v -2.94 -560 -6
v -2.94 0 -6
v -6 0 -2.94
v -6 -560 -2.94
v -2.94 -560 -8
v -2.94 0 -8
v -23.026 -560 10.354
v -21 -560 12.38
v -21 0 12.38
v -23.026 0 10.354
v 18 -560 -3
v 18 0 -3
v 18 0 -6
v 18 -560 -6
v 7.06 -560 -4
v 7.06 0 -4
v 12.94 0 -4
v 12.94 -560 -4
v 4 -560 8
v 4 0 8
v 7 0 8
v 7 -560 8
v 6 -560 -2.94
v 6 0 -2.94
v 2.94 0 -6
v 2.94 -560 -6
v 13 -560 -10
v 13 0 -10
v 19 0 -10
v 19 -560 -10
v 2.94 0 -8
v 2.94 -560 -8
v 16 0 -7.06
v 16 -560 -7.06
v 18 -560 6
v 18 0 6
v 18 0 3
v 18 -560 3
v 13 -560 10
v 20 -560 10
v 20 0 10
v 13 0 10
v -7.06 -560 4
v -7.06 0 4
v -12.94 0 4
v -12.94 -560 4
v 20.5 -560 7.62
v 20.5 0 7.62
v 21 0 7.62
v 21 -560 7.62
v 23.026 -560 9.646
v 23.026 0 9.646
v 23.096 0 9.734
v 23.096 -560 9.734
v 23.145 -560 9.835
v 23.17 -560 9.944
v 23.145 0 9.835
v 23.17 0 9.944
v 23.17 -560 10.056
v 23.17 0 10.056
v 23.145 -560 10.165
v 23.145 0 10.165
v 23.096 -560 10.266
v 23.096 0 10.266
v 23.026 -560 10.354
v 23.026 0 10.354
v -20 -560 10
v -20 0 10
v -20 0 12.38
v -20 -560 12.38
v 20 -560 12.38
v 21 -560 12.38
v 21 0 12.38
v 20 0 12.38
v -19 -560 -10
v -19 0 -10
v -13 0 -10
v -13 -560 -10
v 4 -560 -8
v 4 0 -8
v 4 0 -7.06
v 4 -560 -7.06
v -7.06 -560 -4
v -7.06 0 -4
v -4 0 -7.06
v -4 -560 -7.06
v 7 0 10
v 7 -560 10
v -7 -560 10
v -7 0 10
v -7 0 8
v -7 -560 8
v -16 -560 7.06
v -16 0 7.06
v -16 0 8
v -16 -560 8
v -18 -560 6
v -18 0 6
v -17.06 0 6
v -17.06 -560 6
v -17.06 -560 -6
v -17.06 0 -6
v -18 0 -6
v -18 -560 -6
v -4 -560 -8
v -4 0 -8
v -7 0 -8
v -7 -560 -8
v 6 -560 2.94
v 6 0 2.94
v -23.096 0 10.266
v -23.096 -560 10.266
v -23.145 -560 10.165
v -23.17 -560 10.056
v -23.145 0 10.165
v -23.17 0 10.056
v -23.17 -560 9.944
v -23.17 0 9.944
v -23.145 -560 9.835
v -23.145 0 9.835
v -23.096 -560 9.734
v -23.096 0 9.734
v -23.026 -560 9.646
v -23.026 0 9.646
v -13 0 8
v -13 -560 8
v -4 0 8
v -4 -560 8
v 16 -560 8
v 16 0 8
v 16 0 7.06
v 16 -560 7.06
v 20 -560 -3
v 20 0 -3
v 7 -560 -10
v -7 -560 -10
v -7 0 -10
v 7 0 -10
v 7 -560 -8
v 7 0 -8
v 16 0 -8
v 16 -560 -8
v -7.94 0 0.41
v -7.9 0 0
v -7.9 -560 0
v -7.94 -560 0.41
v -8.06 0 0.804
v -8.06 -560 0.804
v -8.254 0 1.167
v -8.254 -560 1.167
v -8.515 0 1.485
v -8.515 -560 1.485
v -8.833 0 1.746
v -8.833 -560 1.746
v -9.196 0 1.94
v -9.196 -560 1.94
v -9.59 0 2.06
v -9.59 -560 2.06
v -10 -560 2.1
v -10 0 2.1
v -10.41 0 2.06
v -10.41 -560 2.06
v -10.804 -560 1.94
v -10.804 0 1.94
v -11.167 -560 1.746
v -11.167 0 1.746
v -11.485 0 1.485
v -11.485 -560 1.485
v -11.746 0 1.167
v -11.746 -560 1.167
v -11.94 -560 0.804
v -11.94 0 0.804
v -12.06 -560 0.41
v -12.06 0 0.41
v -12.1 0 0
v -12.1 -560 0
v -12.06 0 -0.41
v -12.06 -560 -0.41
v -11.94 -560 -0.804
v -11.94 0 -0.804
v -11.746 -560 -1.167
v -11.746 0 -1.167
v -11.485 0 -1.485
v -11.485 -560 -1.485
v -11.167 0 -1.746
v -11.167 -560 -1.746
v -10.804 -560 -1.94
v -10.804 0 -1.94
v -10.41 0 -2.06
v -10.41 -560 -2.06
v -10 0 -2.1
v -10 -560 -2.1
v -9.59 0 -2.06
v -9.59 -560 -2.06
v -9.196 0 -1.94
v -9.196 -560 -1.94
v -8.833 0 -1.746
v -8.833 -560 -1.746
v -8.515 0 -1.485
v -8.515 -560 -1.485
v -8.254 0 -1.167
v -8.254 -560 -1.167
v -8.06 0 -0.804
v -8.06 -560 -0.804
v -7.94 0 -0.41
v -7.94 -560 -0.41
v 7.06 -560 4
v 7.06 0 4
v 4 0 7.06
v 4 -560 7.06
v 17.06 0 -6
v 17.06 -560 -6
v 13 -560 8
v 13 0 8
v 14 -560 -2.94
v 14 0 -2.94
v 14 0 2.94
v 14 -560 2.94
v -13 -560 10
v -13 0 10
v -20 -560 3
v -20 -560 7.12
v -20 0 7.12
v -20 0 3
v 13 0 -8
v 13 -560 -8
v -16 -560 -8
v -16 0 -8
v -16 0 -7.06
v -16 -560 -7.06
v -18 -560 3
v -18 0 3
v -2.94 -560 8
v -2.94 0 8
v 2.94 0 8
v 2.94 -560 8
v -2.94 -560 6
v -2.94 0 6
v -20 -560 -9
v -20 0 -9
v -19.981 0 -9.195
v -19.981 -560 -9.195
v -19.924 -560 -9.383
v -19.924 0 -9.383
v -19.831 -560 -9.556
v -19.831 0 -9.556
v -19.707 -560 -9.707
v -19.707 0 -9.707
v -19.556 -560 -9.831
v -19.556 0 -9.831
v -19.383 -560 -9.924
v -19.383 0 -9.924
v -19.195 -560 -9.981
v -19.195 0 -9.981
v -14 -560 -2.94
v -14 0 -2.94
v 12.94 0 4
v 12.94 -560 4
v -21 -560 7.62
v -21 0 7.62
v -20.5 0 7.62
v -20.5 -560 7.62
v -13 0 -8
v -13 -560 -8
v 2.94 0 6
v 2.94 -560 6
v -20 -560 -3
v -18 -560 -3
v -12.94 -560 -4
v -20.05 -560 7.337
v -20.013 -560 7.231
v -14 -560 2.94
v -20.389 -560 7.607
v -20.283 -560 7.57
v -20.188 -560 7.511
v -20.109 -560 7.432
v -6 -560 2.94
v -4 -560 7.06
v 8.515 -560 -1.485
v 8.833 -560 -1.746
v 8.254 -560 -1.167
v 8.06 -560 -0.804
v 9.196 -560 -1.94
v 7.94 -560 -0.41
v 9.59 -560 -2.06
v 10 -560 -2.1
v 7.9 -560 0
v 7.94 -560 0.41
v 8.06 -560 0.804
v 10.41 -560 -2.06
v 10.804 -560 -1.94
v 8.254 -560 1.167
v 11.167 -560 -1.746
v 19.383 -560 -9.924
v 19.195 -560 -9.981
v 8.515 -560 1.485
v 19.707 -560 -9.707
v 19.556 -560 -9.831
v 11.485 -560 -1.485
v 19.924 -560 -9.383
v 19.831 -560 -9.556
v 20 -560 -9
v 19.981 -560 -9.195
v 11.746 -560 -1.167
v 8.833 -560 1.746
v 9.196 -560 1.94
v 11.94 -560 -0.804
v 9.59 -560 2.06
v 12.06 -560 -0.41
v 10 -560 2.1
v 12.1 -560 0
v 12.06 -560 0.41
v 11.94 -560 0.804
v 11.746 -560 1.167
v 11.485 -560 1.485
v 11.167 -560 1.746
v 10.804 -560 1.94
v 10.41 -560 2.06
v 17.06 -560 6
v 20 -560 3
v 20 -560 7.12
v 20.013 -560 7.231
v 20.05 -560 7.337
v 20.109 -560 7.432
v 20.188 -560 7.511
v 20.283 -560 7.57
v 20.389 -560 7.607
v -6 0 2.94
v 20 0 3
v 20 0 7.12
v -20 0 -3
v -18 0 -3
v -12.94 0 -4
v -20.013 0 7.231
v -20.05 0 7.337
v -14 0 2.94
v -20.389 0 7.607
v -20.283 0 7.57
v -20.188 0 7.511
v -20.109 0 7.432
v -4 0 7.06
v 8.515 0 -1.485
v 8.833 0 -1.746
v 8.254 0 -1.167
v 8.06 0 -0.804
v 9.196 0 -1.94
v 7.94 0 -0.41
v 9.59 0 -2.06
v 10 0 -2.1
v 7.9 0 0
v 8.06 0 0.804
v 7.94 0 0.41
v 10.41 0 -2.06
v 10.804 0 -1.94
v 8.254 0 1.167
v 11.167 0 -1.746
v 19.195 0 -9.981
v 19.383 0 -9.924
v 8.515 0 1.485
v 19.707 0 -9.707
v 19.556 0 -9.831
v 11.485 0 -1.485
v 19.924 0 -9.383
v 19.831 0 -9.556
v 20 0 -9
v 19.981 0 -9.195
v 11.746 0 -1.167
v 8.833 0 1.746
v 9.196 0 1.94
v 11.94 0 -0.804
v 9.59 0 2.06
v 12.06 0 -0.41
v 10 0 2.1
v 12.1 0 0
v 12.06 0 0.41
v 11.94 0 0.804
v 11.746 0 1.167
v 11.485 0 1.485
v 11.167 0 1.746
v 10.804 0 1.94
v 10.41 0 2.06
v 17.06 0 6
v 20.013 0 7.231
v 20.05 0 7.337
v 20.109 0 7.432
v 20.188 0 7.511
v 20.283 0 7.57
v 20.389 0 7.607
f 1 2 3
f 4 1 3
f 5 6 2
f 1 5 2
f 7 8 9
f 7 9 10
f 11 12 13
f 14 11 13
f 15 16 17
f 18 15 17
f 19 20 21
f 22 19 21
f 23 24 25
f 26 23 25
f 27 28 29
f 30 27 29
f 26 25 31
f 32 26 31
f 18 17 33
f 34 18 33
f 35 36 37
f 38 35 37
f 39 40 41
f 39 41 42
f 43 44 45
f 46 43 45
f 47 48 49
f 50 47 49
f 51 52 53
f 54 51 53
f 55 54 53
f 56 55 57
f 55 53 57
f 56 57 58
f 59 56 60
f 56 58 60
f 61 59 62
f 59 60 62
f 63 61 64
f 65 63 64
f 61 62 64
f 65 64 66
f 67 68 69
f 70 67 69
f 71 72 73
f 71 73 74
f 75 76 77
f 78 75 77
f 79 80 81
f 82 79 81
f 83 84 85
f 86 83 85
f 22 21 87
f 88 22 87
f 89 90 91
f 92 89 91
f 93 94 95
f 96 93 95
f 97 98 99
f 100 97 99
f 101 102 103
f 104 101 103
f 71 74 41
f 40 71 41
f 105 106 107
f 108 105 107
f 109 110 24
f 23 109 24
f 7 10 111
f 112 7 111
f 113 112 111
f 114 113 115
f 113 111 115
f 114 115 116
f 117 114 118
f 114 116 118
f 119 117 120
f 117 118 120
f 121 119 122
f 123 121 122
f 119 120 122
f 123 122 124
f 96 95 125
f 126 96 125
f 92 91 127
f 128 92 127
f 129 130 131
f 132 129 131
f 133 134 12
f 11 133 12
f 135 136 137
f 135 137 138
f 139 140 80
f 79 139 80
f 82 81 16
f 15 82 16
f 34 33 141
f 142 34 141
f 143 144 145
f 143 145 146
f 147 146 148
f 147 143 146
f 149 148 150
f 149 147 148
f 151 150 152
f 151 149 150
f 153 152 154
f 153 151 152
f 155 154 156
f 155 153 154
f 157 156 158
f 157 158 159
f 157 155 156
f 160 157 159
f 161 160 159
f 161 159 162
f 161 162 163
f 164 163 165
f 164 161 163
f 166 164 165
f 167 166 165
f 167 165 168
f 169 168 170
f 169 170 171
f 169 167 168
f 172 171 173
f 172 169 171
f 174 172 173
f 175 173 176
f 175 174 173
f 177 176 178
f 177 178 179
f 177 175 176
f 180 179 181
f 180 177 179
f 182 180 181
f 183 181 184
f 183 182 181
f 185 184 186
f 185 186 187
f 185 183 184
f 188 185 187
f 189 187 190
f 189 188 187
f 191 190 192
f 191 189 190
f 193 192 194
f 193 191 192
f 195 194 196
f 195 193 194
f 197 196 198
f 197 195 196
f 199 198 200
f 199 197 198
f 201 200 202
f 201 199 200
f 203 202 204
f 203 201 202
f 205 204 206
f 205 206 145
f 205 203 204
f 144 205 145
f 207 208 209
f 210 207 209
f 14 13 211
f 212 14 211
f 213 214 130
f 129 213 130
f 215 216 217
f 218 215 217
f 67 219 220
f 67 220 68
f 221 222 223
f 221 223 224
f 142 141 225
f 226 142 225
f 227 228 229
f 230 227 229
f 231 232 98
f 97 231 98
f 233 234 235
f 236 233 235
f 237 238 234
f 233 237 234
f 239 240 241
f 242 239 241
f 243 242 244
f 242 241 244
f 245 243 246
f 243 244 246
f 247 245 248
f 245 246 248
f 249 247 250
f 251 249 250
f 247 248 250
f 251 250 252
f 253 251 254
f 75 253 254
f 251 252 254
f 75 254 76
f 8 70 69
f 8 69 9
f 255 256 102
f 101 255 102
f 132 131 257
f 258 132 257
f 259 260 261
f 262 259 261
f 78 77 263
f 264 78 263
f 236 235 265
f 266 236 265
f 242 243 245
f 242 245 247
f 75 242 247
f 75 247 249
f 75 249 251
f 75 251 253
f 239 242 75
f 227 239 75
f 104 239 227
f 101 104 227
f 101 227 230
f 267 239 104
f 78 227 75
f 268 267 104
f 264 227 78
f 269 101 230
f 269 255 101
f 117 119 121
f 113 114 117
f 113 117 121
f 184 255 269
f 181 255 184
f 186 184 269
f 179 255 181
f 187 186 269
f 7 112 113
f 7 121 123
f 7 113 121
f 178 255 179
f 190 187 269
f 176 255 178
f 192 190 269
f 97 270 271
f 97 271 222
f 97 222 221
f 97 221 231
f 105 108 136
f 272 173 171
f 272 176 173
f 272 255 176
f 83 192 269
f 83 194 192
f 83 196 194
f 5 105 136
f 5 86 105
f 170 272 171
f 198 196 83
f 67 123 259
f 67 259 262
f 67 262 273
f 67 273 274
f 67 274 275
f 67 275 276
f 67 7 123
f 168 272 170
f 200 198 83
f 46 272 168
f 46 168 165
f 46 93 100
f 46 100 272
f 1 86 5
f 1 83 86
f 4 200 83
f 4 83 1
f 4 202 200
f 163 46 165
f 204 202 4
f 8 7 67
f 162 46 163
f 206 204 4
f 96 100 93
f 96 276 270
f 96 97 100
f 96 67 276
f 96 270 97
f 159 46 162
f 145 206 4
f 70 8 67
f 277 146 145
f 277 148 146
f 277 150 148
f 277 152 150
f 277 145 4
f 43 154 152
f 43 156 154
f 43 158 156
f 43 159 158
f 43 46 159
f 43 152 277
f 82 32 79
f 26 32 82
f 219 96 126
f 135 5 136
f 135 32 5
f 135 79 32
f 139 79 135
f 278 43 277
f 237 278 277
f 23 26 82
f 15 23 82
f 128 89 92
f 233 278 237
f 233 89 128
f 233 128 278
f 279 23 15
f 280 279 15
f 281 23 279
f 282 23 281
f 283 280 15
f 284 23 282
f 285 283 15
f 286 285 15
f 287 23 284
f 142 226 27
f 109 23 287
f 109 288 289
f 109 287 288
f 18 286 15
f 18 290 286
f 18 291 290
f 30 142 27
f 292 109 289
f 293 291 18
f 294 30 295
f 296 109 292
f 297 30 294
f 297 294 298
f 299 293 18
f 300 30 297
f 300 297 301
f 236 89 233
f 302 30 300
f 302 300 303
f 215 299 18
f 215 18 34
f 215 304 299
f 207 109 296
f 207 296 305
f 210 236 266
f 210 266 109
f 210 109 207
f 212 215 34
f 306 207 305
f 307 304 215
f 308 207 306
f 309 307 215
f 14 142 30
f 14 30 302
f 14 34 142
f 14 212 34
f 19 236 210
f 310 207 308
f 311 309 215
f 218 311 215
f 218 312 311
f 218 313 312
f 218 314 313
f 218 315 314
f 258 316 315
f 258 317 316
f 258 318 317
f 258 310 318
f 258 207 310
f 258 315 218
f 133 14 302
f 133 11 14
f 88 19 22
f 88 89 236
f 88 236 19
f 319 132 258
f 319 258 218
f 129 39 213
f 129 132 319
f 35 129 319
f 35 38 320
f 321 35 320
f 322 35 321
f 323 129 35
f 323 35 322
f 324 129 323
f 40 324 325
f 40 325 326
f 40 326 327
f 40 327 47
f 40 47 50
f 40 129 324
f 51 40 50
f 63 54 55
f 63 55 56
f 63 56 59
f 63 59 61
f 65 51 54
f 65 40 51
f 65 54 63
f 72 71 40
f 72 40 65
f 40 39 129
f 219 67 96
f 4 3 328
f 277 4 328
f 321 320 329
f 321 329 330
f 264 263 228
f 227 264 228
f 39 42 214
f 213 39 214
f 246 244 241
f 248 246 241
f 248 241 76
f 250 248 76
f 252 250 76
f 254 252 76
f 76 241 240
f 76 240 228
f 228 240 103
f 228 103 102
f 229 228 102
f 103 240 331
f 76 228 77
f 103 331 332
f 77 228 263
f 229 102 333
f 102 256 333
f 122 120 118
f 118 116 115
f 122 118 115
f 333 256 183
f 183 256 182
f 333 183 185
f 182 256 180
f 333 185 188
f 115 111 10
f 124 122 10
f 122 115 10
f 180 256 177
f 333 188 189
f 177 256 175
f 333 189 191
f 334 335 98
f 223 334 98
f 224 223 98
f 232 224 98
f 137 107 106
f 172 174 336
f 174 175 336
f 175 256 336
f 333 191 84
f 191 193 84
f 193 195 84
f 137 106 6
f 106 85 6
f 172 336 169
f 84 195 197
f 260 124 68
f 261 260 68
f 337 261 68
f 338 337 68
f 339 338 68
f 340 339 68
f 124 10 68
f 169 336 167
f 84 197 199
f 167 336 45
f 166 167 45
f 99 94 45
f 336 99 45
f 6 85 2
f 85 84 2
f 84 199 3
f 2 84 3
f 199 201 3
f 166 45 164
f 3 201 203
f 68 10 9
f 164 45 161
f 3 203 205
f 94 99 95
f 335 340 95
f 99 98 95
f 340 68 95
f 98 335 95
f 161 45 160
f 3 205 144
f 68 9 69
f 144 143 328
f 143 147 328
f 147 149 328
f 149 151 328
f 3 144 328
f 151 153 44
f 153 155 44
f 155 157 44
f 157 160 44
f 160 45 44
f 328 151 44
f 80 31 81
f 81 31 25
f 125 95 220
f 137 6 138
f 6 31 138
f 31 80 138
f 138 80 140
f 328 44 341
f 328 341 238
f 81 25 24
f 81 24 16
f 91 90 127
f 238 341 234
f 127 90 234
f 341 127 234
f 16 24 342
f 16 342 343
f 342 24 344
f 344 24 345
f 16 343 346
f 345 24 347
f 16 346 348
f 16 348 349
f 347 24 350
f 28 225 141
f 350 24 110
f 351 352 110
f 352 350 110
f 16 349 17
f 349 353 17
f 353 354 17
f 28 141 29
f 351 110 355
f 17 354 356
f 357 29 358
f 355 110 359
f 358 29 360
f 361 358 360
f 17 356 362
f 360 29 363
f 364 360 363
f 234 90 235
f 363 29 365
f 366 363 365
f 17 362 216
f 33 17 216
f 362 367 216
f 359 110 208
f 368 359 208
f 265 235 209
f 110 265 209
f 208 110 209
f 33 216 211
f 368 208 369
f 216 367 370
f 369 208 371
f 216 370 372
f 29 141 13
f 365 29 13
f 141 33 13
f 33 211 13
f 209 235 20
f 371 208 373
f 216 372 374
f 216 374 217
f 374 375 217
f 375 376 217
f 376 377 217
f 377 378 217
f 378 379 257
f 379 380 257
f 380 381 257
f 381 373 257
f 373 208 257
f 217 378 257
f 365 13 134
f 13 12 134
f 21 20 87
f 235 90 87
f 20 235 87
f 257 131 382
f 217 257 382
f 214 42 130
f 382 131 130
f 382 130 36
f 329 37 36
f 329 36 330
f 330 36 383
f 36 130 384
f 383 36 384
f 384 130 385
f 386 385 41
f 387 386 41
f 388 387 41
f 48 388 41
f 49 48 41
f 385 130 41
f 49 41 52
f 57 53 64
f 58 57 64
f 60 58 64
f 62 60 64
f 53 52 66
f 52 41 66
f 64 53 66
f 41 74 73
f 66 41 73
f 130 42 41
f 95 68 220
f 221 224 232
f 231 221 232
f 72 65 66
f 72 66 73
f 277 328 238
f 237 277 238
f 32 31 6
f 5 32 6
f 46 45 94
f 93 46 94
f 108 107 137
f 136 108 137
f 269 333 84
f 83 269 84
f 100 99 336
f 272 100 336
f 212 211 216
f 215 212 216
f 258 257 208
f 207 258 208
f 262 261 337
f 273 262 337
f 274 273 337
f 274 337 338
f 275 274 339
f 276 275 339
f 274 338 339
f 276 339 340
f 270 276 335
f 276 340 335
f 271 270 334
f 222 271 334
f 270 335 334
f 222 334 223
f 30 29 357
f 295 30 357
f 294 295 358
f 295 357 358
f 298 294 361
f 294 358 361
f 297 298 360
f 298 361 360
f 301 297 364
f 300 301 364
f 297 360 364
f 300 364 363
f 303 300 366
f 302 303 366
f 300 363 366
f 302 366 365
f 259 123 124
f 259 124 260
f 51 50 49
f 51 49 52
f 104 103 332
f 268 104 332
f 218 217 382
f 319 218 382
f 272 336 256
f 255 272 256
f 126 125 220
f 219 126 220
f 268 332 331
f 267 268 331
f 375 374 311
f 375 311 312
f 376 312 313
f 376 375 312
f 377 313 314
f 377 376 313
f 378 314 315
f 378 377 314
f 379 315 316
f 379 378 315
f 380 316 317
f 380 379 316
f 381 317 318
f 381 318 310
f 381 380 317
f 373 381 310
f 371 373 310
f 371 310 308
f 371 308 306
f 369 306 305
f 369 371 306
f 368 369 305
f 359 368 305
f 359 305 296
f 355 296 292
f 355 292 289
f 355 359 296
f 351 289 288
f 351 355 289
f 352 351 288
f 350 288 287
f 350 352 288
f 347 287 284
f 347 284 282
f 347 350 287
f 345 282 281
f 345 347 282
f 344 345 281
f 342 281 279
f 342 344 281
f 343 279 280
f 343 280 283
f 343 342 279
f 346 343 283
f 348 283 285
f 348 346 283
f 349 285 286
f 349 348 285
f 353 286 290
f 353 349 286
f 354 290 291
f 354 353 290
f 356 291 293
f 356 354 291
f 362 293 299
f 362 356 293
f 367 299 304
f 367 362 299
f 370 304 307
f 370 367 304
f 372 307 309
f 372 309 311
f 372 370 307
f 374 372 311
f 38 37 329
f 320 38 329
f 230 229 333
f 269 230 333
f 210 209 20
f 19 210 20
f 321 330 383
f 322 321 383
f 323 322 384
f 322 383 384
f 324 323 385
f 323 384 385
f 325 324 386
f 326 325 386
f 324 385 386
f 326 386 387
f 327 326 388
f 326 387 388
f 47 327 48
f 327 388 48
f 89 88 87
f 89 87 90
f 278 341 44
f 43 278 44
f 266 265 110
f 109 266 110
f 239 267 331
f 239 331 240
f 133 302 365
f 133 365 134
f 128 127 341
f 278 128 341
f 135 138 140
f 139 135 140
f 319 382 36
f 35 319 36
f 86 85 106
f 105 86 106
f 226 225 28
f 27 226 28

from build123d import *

# Parameters (mm, degrees)
F0_R     = 2.1
F1_DEPTH = 560


with BuildPart() as f1:
    # F0 (on Front) → F1 (new body)
    with BuildSketch(Plane.XZ):
        with BuildLine():
            Line((20, 12.38), (20, 10))
            Line((20, 10), (16, 10))
            Line((16, 10), (13, 10))
            Line((13, 10), (13, 8))
            Line((13, 8), (16, 8))
            Line((16, 8), (16, 7.06))
            Line((16, 7.06), (12.94, 4))
            Line((12.94, 4), (7.06, 4))
            Line((7.06, 4), (4, 7.06))
            Line((4, 7.06), (4, 8))
            Line((4, 8), (2.94, 8))
            Line((2.94, 8), (2.94, 6))
            Line((2.94, 6), (6, 2.94))
            Line((6, 2.94), (6, -2.94))
            Line((6, -2.94), (2.94, -6))
            Line((2.94, -6), (2.94, -8))
            Line((2.94, -8), (4, -8))
            Line((4, -8), (4, -7.06))
            Line((4, -7.06), (7.06, -4))
            Line((7.06, -4), (12.94, -4))
            Line((12.94, -4), (16, -7.06))
            Line((16, -7.06), (16, -8))
            Line((16, -8), (13, -8))
            Line((13, -8), (13, -10))
            Line((13, -10), (16, -10))
            Line((16, -10), (19, -10))
            ThreePointArc((19, -10), (19.707107, -9.707107), (20, -9))
            Line((20, -9), (20, -6))
            Line((20, -6), (20, -3))
            Line((20, -3), (18, -3))
            Line((18, -3), (18, -6))
            Line((18, -6), (17.06, -6))
            Line((17.06, -6), (14, -2.94))
            Line((14, -2.94), (14, 2.94))
            Line((14, 2.94), (17.06, 6))
            Line((17.06, 6), (18, 6))
            Line((18, 6), (18, 3))
            Line((18, 3), (20, 3))
            Line((20, 3), (20, 6))
            Line((20, 6), (20, 7.12))
            ThreePointArc((20, 7.12), (20.146447, 7.473553), (20.5, 7.62))
            Line((20.5, 7.62), (21, 7.62))
            Line((21, 7.62), (23.026447, 9.646447))
            ThreePointArc((23.026447, 9.646447), (23.172893, 10), (23.026447, 10.353553))
            Line((23.026447, 10.353553), (21, 12.38))
            Line((21, 12.38), (20, 12.38))
        make_face()
        with Locations((10, 0)):
            Circle(F0_R, mode=Mode.SUBTRACT)
        Polygon((2.94, 8), (4, 8), (7, 8), (7, 10), (1, 10), (-7, 10), (-7, 8), (-4, 8), (-2.94, 8), align=None)
        with BuildLine():
            Line((-2.94, 6), (-2.94, 8))
            Line((-2.94, 8), (-4, 8))
            Line((-4, 8), (-4, 7.06))
            Line((-4, 7.06), (-7.06, 4))
            Line((-7.06, 4), (-12.94, 4))
            Line((-12.94, 4), (-16, 7.06))
            Line((-16, 7.06), (-16, 8))
            Line((-16, 8), (-13, 8))
            Line((-13, 8), (-13, 10))
            Line((-13, 10), (-16, 10))
            Line((-16, 10), (-20, 10))
            Line((-20, 10), (-20, 12.38))
            Line((-20, 12.38), (-21, 12.38))
            Line((-21, 12.38), (-23.026447, 10.353553))
            ThreePointArc((-23.026447, 10.353553), (-23.172893, 10), (-23.026447, 9.646447))
            Line((-23.026447, 9.646447), (-21, 7.62))
            Line((-21, 7.62), (-20.5, 7.62))
            ThreePointArc((-20.5, 7.62), (-20.146447, 7.473553), (-20, 7.12))
            Line((-20, 7.12), (-20, 6))
            Line((-20, 6), (-20, 3))
            Line((-20, 3), (-18, 3))
            Line((-18, 3), (-18, 6))
            Line((-18, 6), (-17.06, 6))
            Line((-17.06, 6), (-14, 2.94))
            Line((-14, 2.94), (-14, -2.94))
            Line((-14, -2.94), (-17.06, -6))
            Line((-17.06, -6), (-18, -6))
            Line((-18, -6), (-18, -3))
            Line((-18, -3), (-20, -3))
            Line((-20, -3), (-20, -6))
            Line((-20, -6), (-20, -9))
            ThreePointArc((-20, -9), (-19.707107, -9.707107), (-19, -10))
            Line((-19, -10), (-16, -10))
            Line((-16, -10), (-13, -10))
            Line((-13, -10), (-13, -8))
            Line((-13, -8), (-16, -8))
            Line((-16, -8), (-16, -7.06))
            Line((-16, -7.06), (-12.94, -4))
            Line((-12.94, -4), (-7.06, -4))
            Line((-7.06, -4), (-4, -7.06))
            Line((-4, -7.06), (-4, -8))
            Line((-4, -8), (-7, -8))
            Line((-7, -8), (-7, -10))
            Line((-7, -10), (7, -10))
            Line((7, -10), (7, -8))
            Line((7, -8), (4, -8))
            Line((4, -8), (2.94, -8))
            Line((2.94, -8), (-2.94, -8))
            Line((-2.94, -8), (-2.94, -6))
            Line((-2.94, -6), (-6, -2.94))
            Line((-6, -2.94), (-6, 2.94))
            Line((-6, 2.94), (-2.94, 6))
        make_face()
        with Locations((-10, 0)):
            Circle(F0_R, mode=Mode.SUBTRACT)
    extrude(amount=F1_DEPTH)


solid = f1.part
